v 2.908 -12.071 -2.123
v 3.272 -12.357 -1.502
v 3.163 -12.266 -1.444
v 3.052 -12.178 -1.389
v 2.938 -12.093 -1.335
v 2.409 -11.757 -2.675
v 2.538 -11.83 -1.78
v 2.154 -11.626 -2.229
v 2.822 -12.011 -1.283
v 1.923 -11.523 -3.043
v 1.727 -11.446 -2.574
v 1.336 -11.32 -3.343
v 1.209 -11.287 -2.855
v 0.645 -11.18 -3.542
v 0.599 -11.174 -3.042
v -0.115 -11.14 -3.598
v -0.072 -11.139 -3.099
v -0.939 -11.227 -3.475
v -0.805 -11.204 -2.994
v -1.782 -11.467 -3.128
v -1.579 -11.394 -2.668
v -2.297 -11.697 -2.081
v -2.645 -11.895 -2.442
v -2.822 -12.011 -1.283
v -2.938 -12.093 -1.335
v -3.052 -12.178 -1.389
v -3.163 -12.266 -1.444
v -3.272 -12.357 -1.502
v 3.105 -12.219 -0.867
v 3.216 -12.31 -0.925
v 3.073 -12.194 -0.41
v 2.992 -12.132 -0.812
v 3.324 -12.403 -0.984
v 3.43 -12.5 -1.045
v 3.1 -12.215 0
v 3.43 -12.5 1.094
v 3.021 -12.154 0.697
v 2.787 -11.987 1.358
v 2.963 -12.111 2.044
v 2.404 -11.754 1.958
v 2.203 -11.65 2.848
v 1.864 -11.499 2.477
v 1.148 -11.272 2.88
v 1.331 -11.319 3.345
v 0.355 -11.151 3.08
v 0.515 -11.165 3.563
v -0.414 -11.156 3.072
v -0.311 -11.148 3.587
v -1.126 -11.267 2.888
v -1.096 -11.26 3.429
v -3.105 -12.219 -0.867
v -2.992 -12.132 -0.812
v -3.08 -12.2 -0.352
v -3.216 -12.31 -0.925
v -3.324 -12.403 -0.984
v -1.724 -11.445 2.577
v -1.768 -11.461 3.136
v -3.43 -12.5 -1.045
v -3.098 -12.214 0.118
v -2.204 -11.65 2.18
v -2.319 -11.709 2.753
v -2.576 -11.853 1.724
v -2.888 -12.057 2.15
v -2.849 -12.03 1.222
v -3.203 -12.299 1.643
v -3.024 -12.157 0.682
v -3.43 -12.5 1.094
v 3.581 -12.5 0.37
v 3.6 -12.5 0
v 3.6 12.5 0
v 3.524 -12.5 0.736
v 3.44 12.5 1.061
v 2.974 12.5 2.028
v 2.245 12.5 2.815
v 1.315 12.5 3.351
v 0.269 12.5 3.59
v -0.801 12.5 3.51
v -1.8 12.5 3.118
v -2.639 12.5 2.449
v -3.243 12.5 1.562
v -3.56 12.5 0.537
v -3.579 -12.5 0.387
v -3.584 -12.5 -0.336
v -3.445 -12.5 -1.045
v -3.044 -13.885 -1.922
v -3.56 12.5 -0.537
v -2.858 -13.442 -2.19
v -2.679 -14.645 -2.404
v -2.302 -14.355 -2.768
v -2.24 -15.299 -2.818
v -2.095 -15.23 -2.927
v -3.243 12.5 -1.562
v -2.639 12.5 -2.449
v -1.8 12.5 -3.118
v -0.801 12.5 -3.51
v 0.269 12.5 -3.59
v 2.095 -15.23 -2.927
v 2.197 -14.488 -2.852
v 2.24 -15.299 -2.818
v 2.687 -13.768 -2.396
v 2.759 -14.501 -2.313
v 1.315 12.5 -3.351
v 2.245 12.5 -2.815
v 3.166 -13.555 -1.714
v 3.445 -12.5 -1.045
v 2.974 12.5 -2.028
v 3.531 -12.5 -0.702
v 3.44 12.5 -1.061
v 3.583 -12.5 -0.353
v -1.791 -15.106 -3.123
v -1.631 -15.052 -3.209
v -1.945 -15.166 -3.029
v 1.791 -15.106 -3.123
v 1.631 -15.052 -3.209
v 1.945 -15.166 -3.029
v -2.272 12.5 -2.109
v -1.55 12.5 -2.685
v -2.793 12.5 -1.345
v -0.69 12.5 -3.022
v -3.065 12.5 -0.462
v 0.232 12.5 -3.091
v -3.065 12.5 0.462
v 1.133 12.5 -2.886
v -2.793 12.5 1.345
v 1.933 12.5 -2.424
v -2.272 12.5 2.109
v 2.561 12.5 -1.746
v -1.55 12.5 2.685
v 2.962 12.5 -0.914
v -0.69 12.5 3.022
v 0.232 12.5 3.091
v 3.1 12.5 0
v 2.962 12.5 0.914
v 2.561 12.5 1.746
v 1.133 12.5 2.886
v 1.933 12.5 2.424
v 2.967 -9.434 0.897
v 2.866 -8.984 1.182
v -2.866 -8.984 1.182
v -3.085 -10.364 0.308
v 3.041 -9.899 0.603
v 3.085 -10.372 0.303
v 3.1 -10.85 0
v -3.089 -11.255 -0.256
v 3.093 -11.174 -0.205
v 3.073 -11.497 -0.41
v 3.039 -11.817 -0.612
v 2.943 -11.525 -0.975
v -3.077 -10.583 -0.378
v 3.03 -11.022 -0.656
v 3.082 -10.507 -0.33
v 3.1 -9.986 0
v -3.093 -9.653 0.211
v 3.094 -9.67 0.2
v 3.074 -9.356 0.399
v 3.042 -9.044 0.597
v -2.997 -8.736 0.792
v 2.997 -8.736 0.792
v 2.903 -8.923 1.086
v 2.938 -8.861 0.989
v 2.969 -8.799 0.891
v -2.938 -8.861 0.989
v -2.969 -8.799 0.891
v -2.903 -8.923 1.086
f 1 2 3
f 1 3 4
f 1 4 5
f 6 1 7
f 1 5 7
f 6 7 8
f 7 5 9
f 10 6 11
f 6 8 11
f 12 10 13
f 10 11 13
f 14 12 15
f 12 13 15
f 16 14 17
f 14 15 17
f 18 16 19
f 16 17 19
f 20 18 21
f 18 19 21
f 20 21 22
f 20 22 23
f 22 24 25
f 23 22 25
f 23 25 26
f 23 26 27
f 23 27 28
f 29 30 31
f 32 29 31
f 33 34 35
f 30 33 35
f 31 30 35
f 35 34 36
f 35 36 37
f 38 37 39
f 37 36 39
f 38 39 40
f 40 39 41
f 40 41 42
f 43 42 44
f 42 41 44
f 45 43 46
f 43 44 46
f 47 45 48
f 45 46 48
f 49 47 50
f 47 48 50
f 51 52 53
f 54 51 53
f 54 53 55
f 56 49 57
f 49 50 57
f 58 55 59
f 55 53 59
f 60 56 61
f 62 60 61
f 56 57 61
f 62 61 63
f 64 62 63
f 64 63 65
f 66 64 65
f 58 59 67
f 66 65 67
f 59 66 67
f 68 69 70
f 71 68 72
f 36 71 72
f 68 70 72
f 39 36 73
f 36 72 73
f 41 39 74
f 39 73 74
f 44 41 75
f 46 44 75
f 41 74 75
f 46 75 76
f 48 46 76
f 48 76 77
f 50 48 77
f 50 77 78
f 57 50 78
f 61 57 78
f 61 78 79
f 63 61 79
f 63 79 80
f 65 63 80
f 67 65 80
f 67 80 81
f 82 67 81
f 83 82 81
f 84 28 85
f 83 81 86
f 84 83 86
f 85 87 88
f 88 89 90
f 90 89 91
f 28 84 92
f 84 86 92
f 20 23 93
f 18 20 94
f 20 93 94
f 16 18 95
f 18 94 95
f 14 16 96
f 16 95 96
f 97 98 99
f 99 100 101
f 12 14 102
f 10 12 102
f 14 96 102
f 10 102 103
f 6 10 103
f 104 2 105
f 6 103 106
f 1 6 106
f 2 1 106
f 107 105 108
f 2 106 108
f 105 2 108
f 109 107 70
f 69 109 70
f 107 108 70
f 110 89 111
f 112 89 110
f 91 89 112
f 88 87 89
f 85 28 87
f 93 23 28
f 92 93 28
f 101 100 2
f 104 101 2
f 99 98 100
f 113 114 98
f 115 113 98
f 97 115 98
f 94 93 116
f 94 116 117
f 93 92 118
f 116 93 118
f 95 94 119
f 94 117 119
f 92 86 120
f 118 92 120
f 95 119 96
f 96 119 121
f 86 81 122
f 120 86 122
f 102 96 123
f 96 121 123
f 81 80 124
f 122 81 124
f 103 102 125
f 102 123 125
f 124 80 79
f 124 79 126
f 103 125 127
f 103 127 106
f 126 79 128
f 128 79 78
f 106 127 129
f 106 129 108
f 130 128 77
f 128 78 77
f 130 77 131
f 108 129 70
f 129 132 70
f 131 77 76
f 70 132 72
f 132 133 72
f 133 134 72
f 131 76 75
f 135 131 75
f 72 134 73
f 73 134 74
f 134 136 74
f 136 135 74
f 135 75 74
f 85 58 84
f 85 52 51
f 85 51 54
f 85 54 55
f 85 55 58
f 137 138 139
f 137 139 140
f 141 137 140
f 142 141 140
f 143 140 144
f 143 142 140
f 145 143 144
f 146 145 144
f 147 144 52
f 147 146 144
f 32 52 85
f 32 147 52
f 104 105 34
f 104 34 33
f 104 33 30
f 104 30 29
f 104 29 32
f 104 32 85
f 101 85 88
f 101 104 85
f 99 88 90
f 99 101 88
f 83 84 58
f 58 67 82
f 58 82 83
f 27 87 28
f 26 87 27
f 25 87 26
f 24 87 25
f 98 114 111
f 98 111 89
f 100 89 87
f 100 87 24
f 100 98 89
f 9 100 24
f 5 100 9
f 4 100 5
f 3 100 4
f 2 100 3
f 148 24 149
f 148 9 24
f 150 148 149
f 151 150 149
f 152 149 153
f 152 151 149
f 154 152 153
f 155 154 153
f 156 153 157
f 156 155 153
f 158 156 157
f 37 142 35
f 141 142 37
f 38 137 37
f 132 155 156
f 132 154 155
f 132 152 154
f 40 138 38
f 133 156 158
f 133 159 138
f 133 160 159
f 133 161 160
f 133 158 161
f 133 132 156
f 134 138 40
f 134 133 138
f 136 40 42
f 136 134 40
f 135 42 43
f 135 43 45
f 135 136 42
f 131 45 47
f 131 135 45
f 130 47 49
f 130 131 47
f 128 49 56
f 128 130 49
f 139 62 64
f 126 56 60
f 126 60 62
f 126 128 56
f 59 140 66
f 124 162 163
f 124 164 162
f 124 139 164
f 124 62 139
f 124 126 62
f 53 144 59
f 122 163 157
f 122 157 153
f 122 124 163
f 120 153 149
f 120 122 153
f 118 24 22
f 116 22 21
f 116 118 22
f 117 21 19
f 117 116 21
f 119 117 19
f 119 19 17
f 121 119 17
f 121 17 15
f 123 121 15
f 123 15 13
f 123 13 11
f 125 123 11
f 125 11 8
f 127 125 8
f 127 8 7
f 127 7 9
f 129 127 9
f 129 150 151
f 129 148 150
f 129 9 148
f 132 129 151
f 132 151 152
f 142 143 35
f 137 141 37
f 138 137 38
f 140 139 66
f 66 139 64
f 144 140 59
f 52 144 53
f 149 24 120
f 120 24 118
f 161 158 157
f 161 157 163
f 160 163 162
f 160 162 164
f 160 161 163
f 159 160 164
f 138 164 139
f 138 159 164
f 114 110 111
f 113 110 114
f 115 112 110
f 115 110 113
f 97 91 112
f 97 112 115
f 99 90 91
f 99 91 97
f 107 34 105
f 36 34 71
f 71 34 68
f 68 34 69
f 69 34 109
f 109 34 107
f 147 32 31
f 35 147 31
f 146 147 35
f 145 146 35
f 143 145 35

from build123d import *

# Parameters (mm, degrees)
F0_R     = 3.6
F0_R_2   = 3.1
F1_DEPTH = 12.5
F2_R     = 5
F3_DEPTH = 12.5
F5_DEPTH = 4
F6_R     = 5.6839494551
F6_R_2   = 3.6
F7_DEPTH = 25


# Not quite as in the source:
# - a feature names something its author has since deleted; it is built from what else it names


with BuildPart() as f1:
    # F0 (on Front) → F1 (new body, symmetric)
    with BuildSketch(Plane.XZ):
        Circle(F0_R)
        Circle(F0_R_2, mode=Mode.SUBTRACT)
    extrude(amount=F1_DEPTH, both=True)

    # F2 (on Top) → F3 (cut, symmetric)
    with BuildSketch(Plane.XY):
        with Locations((0, -16.1383841203)):
            Circle(F2_R)
    extrude(amount=F3_DEPTH, both=True, mode=Mode.SUBTRACT)

    # F4 (on Right) → F5 (join, symmetric)
    with BuildSketch(Plane.YZ):
        Polygon((-15.2992176846, -2.8184308636), (-15.0516938496, -3.2091679669), (-8.7361828689, 0.7915769966), (-8.9837067039, 1.1823140999), align=None)
    extrude(amount=F5_DEPTH, both=True)

    # F6 (on Front) → F7 (cut, symmetric)
    with BuildSketch(Plane.XZ):
        Circle(F6_R)
        Circle(F6_R_2, mode=Mode.SUBTRACT)
    extrude(amount=F7_DEPTH, both=True, mode=Mode.SUBTRACT)


solid = f1.part
